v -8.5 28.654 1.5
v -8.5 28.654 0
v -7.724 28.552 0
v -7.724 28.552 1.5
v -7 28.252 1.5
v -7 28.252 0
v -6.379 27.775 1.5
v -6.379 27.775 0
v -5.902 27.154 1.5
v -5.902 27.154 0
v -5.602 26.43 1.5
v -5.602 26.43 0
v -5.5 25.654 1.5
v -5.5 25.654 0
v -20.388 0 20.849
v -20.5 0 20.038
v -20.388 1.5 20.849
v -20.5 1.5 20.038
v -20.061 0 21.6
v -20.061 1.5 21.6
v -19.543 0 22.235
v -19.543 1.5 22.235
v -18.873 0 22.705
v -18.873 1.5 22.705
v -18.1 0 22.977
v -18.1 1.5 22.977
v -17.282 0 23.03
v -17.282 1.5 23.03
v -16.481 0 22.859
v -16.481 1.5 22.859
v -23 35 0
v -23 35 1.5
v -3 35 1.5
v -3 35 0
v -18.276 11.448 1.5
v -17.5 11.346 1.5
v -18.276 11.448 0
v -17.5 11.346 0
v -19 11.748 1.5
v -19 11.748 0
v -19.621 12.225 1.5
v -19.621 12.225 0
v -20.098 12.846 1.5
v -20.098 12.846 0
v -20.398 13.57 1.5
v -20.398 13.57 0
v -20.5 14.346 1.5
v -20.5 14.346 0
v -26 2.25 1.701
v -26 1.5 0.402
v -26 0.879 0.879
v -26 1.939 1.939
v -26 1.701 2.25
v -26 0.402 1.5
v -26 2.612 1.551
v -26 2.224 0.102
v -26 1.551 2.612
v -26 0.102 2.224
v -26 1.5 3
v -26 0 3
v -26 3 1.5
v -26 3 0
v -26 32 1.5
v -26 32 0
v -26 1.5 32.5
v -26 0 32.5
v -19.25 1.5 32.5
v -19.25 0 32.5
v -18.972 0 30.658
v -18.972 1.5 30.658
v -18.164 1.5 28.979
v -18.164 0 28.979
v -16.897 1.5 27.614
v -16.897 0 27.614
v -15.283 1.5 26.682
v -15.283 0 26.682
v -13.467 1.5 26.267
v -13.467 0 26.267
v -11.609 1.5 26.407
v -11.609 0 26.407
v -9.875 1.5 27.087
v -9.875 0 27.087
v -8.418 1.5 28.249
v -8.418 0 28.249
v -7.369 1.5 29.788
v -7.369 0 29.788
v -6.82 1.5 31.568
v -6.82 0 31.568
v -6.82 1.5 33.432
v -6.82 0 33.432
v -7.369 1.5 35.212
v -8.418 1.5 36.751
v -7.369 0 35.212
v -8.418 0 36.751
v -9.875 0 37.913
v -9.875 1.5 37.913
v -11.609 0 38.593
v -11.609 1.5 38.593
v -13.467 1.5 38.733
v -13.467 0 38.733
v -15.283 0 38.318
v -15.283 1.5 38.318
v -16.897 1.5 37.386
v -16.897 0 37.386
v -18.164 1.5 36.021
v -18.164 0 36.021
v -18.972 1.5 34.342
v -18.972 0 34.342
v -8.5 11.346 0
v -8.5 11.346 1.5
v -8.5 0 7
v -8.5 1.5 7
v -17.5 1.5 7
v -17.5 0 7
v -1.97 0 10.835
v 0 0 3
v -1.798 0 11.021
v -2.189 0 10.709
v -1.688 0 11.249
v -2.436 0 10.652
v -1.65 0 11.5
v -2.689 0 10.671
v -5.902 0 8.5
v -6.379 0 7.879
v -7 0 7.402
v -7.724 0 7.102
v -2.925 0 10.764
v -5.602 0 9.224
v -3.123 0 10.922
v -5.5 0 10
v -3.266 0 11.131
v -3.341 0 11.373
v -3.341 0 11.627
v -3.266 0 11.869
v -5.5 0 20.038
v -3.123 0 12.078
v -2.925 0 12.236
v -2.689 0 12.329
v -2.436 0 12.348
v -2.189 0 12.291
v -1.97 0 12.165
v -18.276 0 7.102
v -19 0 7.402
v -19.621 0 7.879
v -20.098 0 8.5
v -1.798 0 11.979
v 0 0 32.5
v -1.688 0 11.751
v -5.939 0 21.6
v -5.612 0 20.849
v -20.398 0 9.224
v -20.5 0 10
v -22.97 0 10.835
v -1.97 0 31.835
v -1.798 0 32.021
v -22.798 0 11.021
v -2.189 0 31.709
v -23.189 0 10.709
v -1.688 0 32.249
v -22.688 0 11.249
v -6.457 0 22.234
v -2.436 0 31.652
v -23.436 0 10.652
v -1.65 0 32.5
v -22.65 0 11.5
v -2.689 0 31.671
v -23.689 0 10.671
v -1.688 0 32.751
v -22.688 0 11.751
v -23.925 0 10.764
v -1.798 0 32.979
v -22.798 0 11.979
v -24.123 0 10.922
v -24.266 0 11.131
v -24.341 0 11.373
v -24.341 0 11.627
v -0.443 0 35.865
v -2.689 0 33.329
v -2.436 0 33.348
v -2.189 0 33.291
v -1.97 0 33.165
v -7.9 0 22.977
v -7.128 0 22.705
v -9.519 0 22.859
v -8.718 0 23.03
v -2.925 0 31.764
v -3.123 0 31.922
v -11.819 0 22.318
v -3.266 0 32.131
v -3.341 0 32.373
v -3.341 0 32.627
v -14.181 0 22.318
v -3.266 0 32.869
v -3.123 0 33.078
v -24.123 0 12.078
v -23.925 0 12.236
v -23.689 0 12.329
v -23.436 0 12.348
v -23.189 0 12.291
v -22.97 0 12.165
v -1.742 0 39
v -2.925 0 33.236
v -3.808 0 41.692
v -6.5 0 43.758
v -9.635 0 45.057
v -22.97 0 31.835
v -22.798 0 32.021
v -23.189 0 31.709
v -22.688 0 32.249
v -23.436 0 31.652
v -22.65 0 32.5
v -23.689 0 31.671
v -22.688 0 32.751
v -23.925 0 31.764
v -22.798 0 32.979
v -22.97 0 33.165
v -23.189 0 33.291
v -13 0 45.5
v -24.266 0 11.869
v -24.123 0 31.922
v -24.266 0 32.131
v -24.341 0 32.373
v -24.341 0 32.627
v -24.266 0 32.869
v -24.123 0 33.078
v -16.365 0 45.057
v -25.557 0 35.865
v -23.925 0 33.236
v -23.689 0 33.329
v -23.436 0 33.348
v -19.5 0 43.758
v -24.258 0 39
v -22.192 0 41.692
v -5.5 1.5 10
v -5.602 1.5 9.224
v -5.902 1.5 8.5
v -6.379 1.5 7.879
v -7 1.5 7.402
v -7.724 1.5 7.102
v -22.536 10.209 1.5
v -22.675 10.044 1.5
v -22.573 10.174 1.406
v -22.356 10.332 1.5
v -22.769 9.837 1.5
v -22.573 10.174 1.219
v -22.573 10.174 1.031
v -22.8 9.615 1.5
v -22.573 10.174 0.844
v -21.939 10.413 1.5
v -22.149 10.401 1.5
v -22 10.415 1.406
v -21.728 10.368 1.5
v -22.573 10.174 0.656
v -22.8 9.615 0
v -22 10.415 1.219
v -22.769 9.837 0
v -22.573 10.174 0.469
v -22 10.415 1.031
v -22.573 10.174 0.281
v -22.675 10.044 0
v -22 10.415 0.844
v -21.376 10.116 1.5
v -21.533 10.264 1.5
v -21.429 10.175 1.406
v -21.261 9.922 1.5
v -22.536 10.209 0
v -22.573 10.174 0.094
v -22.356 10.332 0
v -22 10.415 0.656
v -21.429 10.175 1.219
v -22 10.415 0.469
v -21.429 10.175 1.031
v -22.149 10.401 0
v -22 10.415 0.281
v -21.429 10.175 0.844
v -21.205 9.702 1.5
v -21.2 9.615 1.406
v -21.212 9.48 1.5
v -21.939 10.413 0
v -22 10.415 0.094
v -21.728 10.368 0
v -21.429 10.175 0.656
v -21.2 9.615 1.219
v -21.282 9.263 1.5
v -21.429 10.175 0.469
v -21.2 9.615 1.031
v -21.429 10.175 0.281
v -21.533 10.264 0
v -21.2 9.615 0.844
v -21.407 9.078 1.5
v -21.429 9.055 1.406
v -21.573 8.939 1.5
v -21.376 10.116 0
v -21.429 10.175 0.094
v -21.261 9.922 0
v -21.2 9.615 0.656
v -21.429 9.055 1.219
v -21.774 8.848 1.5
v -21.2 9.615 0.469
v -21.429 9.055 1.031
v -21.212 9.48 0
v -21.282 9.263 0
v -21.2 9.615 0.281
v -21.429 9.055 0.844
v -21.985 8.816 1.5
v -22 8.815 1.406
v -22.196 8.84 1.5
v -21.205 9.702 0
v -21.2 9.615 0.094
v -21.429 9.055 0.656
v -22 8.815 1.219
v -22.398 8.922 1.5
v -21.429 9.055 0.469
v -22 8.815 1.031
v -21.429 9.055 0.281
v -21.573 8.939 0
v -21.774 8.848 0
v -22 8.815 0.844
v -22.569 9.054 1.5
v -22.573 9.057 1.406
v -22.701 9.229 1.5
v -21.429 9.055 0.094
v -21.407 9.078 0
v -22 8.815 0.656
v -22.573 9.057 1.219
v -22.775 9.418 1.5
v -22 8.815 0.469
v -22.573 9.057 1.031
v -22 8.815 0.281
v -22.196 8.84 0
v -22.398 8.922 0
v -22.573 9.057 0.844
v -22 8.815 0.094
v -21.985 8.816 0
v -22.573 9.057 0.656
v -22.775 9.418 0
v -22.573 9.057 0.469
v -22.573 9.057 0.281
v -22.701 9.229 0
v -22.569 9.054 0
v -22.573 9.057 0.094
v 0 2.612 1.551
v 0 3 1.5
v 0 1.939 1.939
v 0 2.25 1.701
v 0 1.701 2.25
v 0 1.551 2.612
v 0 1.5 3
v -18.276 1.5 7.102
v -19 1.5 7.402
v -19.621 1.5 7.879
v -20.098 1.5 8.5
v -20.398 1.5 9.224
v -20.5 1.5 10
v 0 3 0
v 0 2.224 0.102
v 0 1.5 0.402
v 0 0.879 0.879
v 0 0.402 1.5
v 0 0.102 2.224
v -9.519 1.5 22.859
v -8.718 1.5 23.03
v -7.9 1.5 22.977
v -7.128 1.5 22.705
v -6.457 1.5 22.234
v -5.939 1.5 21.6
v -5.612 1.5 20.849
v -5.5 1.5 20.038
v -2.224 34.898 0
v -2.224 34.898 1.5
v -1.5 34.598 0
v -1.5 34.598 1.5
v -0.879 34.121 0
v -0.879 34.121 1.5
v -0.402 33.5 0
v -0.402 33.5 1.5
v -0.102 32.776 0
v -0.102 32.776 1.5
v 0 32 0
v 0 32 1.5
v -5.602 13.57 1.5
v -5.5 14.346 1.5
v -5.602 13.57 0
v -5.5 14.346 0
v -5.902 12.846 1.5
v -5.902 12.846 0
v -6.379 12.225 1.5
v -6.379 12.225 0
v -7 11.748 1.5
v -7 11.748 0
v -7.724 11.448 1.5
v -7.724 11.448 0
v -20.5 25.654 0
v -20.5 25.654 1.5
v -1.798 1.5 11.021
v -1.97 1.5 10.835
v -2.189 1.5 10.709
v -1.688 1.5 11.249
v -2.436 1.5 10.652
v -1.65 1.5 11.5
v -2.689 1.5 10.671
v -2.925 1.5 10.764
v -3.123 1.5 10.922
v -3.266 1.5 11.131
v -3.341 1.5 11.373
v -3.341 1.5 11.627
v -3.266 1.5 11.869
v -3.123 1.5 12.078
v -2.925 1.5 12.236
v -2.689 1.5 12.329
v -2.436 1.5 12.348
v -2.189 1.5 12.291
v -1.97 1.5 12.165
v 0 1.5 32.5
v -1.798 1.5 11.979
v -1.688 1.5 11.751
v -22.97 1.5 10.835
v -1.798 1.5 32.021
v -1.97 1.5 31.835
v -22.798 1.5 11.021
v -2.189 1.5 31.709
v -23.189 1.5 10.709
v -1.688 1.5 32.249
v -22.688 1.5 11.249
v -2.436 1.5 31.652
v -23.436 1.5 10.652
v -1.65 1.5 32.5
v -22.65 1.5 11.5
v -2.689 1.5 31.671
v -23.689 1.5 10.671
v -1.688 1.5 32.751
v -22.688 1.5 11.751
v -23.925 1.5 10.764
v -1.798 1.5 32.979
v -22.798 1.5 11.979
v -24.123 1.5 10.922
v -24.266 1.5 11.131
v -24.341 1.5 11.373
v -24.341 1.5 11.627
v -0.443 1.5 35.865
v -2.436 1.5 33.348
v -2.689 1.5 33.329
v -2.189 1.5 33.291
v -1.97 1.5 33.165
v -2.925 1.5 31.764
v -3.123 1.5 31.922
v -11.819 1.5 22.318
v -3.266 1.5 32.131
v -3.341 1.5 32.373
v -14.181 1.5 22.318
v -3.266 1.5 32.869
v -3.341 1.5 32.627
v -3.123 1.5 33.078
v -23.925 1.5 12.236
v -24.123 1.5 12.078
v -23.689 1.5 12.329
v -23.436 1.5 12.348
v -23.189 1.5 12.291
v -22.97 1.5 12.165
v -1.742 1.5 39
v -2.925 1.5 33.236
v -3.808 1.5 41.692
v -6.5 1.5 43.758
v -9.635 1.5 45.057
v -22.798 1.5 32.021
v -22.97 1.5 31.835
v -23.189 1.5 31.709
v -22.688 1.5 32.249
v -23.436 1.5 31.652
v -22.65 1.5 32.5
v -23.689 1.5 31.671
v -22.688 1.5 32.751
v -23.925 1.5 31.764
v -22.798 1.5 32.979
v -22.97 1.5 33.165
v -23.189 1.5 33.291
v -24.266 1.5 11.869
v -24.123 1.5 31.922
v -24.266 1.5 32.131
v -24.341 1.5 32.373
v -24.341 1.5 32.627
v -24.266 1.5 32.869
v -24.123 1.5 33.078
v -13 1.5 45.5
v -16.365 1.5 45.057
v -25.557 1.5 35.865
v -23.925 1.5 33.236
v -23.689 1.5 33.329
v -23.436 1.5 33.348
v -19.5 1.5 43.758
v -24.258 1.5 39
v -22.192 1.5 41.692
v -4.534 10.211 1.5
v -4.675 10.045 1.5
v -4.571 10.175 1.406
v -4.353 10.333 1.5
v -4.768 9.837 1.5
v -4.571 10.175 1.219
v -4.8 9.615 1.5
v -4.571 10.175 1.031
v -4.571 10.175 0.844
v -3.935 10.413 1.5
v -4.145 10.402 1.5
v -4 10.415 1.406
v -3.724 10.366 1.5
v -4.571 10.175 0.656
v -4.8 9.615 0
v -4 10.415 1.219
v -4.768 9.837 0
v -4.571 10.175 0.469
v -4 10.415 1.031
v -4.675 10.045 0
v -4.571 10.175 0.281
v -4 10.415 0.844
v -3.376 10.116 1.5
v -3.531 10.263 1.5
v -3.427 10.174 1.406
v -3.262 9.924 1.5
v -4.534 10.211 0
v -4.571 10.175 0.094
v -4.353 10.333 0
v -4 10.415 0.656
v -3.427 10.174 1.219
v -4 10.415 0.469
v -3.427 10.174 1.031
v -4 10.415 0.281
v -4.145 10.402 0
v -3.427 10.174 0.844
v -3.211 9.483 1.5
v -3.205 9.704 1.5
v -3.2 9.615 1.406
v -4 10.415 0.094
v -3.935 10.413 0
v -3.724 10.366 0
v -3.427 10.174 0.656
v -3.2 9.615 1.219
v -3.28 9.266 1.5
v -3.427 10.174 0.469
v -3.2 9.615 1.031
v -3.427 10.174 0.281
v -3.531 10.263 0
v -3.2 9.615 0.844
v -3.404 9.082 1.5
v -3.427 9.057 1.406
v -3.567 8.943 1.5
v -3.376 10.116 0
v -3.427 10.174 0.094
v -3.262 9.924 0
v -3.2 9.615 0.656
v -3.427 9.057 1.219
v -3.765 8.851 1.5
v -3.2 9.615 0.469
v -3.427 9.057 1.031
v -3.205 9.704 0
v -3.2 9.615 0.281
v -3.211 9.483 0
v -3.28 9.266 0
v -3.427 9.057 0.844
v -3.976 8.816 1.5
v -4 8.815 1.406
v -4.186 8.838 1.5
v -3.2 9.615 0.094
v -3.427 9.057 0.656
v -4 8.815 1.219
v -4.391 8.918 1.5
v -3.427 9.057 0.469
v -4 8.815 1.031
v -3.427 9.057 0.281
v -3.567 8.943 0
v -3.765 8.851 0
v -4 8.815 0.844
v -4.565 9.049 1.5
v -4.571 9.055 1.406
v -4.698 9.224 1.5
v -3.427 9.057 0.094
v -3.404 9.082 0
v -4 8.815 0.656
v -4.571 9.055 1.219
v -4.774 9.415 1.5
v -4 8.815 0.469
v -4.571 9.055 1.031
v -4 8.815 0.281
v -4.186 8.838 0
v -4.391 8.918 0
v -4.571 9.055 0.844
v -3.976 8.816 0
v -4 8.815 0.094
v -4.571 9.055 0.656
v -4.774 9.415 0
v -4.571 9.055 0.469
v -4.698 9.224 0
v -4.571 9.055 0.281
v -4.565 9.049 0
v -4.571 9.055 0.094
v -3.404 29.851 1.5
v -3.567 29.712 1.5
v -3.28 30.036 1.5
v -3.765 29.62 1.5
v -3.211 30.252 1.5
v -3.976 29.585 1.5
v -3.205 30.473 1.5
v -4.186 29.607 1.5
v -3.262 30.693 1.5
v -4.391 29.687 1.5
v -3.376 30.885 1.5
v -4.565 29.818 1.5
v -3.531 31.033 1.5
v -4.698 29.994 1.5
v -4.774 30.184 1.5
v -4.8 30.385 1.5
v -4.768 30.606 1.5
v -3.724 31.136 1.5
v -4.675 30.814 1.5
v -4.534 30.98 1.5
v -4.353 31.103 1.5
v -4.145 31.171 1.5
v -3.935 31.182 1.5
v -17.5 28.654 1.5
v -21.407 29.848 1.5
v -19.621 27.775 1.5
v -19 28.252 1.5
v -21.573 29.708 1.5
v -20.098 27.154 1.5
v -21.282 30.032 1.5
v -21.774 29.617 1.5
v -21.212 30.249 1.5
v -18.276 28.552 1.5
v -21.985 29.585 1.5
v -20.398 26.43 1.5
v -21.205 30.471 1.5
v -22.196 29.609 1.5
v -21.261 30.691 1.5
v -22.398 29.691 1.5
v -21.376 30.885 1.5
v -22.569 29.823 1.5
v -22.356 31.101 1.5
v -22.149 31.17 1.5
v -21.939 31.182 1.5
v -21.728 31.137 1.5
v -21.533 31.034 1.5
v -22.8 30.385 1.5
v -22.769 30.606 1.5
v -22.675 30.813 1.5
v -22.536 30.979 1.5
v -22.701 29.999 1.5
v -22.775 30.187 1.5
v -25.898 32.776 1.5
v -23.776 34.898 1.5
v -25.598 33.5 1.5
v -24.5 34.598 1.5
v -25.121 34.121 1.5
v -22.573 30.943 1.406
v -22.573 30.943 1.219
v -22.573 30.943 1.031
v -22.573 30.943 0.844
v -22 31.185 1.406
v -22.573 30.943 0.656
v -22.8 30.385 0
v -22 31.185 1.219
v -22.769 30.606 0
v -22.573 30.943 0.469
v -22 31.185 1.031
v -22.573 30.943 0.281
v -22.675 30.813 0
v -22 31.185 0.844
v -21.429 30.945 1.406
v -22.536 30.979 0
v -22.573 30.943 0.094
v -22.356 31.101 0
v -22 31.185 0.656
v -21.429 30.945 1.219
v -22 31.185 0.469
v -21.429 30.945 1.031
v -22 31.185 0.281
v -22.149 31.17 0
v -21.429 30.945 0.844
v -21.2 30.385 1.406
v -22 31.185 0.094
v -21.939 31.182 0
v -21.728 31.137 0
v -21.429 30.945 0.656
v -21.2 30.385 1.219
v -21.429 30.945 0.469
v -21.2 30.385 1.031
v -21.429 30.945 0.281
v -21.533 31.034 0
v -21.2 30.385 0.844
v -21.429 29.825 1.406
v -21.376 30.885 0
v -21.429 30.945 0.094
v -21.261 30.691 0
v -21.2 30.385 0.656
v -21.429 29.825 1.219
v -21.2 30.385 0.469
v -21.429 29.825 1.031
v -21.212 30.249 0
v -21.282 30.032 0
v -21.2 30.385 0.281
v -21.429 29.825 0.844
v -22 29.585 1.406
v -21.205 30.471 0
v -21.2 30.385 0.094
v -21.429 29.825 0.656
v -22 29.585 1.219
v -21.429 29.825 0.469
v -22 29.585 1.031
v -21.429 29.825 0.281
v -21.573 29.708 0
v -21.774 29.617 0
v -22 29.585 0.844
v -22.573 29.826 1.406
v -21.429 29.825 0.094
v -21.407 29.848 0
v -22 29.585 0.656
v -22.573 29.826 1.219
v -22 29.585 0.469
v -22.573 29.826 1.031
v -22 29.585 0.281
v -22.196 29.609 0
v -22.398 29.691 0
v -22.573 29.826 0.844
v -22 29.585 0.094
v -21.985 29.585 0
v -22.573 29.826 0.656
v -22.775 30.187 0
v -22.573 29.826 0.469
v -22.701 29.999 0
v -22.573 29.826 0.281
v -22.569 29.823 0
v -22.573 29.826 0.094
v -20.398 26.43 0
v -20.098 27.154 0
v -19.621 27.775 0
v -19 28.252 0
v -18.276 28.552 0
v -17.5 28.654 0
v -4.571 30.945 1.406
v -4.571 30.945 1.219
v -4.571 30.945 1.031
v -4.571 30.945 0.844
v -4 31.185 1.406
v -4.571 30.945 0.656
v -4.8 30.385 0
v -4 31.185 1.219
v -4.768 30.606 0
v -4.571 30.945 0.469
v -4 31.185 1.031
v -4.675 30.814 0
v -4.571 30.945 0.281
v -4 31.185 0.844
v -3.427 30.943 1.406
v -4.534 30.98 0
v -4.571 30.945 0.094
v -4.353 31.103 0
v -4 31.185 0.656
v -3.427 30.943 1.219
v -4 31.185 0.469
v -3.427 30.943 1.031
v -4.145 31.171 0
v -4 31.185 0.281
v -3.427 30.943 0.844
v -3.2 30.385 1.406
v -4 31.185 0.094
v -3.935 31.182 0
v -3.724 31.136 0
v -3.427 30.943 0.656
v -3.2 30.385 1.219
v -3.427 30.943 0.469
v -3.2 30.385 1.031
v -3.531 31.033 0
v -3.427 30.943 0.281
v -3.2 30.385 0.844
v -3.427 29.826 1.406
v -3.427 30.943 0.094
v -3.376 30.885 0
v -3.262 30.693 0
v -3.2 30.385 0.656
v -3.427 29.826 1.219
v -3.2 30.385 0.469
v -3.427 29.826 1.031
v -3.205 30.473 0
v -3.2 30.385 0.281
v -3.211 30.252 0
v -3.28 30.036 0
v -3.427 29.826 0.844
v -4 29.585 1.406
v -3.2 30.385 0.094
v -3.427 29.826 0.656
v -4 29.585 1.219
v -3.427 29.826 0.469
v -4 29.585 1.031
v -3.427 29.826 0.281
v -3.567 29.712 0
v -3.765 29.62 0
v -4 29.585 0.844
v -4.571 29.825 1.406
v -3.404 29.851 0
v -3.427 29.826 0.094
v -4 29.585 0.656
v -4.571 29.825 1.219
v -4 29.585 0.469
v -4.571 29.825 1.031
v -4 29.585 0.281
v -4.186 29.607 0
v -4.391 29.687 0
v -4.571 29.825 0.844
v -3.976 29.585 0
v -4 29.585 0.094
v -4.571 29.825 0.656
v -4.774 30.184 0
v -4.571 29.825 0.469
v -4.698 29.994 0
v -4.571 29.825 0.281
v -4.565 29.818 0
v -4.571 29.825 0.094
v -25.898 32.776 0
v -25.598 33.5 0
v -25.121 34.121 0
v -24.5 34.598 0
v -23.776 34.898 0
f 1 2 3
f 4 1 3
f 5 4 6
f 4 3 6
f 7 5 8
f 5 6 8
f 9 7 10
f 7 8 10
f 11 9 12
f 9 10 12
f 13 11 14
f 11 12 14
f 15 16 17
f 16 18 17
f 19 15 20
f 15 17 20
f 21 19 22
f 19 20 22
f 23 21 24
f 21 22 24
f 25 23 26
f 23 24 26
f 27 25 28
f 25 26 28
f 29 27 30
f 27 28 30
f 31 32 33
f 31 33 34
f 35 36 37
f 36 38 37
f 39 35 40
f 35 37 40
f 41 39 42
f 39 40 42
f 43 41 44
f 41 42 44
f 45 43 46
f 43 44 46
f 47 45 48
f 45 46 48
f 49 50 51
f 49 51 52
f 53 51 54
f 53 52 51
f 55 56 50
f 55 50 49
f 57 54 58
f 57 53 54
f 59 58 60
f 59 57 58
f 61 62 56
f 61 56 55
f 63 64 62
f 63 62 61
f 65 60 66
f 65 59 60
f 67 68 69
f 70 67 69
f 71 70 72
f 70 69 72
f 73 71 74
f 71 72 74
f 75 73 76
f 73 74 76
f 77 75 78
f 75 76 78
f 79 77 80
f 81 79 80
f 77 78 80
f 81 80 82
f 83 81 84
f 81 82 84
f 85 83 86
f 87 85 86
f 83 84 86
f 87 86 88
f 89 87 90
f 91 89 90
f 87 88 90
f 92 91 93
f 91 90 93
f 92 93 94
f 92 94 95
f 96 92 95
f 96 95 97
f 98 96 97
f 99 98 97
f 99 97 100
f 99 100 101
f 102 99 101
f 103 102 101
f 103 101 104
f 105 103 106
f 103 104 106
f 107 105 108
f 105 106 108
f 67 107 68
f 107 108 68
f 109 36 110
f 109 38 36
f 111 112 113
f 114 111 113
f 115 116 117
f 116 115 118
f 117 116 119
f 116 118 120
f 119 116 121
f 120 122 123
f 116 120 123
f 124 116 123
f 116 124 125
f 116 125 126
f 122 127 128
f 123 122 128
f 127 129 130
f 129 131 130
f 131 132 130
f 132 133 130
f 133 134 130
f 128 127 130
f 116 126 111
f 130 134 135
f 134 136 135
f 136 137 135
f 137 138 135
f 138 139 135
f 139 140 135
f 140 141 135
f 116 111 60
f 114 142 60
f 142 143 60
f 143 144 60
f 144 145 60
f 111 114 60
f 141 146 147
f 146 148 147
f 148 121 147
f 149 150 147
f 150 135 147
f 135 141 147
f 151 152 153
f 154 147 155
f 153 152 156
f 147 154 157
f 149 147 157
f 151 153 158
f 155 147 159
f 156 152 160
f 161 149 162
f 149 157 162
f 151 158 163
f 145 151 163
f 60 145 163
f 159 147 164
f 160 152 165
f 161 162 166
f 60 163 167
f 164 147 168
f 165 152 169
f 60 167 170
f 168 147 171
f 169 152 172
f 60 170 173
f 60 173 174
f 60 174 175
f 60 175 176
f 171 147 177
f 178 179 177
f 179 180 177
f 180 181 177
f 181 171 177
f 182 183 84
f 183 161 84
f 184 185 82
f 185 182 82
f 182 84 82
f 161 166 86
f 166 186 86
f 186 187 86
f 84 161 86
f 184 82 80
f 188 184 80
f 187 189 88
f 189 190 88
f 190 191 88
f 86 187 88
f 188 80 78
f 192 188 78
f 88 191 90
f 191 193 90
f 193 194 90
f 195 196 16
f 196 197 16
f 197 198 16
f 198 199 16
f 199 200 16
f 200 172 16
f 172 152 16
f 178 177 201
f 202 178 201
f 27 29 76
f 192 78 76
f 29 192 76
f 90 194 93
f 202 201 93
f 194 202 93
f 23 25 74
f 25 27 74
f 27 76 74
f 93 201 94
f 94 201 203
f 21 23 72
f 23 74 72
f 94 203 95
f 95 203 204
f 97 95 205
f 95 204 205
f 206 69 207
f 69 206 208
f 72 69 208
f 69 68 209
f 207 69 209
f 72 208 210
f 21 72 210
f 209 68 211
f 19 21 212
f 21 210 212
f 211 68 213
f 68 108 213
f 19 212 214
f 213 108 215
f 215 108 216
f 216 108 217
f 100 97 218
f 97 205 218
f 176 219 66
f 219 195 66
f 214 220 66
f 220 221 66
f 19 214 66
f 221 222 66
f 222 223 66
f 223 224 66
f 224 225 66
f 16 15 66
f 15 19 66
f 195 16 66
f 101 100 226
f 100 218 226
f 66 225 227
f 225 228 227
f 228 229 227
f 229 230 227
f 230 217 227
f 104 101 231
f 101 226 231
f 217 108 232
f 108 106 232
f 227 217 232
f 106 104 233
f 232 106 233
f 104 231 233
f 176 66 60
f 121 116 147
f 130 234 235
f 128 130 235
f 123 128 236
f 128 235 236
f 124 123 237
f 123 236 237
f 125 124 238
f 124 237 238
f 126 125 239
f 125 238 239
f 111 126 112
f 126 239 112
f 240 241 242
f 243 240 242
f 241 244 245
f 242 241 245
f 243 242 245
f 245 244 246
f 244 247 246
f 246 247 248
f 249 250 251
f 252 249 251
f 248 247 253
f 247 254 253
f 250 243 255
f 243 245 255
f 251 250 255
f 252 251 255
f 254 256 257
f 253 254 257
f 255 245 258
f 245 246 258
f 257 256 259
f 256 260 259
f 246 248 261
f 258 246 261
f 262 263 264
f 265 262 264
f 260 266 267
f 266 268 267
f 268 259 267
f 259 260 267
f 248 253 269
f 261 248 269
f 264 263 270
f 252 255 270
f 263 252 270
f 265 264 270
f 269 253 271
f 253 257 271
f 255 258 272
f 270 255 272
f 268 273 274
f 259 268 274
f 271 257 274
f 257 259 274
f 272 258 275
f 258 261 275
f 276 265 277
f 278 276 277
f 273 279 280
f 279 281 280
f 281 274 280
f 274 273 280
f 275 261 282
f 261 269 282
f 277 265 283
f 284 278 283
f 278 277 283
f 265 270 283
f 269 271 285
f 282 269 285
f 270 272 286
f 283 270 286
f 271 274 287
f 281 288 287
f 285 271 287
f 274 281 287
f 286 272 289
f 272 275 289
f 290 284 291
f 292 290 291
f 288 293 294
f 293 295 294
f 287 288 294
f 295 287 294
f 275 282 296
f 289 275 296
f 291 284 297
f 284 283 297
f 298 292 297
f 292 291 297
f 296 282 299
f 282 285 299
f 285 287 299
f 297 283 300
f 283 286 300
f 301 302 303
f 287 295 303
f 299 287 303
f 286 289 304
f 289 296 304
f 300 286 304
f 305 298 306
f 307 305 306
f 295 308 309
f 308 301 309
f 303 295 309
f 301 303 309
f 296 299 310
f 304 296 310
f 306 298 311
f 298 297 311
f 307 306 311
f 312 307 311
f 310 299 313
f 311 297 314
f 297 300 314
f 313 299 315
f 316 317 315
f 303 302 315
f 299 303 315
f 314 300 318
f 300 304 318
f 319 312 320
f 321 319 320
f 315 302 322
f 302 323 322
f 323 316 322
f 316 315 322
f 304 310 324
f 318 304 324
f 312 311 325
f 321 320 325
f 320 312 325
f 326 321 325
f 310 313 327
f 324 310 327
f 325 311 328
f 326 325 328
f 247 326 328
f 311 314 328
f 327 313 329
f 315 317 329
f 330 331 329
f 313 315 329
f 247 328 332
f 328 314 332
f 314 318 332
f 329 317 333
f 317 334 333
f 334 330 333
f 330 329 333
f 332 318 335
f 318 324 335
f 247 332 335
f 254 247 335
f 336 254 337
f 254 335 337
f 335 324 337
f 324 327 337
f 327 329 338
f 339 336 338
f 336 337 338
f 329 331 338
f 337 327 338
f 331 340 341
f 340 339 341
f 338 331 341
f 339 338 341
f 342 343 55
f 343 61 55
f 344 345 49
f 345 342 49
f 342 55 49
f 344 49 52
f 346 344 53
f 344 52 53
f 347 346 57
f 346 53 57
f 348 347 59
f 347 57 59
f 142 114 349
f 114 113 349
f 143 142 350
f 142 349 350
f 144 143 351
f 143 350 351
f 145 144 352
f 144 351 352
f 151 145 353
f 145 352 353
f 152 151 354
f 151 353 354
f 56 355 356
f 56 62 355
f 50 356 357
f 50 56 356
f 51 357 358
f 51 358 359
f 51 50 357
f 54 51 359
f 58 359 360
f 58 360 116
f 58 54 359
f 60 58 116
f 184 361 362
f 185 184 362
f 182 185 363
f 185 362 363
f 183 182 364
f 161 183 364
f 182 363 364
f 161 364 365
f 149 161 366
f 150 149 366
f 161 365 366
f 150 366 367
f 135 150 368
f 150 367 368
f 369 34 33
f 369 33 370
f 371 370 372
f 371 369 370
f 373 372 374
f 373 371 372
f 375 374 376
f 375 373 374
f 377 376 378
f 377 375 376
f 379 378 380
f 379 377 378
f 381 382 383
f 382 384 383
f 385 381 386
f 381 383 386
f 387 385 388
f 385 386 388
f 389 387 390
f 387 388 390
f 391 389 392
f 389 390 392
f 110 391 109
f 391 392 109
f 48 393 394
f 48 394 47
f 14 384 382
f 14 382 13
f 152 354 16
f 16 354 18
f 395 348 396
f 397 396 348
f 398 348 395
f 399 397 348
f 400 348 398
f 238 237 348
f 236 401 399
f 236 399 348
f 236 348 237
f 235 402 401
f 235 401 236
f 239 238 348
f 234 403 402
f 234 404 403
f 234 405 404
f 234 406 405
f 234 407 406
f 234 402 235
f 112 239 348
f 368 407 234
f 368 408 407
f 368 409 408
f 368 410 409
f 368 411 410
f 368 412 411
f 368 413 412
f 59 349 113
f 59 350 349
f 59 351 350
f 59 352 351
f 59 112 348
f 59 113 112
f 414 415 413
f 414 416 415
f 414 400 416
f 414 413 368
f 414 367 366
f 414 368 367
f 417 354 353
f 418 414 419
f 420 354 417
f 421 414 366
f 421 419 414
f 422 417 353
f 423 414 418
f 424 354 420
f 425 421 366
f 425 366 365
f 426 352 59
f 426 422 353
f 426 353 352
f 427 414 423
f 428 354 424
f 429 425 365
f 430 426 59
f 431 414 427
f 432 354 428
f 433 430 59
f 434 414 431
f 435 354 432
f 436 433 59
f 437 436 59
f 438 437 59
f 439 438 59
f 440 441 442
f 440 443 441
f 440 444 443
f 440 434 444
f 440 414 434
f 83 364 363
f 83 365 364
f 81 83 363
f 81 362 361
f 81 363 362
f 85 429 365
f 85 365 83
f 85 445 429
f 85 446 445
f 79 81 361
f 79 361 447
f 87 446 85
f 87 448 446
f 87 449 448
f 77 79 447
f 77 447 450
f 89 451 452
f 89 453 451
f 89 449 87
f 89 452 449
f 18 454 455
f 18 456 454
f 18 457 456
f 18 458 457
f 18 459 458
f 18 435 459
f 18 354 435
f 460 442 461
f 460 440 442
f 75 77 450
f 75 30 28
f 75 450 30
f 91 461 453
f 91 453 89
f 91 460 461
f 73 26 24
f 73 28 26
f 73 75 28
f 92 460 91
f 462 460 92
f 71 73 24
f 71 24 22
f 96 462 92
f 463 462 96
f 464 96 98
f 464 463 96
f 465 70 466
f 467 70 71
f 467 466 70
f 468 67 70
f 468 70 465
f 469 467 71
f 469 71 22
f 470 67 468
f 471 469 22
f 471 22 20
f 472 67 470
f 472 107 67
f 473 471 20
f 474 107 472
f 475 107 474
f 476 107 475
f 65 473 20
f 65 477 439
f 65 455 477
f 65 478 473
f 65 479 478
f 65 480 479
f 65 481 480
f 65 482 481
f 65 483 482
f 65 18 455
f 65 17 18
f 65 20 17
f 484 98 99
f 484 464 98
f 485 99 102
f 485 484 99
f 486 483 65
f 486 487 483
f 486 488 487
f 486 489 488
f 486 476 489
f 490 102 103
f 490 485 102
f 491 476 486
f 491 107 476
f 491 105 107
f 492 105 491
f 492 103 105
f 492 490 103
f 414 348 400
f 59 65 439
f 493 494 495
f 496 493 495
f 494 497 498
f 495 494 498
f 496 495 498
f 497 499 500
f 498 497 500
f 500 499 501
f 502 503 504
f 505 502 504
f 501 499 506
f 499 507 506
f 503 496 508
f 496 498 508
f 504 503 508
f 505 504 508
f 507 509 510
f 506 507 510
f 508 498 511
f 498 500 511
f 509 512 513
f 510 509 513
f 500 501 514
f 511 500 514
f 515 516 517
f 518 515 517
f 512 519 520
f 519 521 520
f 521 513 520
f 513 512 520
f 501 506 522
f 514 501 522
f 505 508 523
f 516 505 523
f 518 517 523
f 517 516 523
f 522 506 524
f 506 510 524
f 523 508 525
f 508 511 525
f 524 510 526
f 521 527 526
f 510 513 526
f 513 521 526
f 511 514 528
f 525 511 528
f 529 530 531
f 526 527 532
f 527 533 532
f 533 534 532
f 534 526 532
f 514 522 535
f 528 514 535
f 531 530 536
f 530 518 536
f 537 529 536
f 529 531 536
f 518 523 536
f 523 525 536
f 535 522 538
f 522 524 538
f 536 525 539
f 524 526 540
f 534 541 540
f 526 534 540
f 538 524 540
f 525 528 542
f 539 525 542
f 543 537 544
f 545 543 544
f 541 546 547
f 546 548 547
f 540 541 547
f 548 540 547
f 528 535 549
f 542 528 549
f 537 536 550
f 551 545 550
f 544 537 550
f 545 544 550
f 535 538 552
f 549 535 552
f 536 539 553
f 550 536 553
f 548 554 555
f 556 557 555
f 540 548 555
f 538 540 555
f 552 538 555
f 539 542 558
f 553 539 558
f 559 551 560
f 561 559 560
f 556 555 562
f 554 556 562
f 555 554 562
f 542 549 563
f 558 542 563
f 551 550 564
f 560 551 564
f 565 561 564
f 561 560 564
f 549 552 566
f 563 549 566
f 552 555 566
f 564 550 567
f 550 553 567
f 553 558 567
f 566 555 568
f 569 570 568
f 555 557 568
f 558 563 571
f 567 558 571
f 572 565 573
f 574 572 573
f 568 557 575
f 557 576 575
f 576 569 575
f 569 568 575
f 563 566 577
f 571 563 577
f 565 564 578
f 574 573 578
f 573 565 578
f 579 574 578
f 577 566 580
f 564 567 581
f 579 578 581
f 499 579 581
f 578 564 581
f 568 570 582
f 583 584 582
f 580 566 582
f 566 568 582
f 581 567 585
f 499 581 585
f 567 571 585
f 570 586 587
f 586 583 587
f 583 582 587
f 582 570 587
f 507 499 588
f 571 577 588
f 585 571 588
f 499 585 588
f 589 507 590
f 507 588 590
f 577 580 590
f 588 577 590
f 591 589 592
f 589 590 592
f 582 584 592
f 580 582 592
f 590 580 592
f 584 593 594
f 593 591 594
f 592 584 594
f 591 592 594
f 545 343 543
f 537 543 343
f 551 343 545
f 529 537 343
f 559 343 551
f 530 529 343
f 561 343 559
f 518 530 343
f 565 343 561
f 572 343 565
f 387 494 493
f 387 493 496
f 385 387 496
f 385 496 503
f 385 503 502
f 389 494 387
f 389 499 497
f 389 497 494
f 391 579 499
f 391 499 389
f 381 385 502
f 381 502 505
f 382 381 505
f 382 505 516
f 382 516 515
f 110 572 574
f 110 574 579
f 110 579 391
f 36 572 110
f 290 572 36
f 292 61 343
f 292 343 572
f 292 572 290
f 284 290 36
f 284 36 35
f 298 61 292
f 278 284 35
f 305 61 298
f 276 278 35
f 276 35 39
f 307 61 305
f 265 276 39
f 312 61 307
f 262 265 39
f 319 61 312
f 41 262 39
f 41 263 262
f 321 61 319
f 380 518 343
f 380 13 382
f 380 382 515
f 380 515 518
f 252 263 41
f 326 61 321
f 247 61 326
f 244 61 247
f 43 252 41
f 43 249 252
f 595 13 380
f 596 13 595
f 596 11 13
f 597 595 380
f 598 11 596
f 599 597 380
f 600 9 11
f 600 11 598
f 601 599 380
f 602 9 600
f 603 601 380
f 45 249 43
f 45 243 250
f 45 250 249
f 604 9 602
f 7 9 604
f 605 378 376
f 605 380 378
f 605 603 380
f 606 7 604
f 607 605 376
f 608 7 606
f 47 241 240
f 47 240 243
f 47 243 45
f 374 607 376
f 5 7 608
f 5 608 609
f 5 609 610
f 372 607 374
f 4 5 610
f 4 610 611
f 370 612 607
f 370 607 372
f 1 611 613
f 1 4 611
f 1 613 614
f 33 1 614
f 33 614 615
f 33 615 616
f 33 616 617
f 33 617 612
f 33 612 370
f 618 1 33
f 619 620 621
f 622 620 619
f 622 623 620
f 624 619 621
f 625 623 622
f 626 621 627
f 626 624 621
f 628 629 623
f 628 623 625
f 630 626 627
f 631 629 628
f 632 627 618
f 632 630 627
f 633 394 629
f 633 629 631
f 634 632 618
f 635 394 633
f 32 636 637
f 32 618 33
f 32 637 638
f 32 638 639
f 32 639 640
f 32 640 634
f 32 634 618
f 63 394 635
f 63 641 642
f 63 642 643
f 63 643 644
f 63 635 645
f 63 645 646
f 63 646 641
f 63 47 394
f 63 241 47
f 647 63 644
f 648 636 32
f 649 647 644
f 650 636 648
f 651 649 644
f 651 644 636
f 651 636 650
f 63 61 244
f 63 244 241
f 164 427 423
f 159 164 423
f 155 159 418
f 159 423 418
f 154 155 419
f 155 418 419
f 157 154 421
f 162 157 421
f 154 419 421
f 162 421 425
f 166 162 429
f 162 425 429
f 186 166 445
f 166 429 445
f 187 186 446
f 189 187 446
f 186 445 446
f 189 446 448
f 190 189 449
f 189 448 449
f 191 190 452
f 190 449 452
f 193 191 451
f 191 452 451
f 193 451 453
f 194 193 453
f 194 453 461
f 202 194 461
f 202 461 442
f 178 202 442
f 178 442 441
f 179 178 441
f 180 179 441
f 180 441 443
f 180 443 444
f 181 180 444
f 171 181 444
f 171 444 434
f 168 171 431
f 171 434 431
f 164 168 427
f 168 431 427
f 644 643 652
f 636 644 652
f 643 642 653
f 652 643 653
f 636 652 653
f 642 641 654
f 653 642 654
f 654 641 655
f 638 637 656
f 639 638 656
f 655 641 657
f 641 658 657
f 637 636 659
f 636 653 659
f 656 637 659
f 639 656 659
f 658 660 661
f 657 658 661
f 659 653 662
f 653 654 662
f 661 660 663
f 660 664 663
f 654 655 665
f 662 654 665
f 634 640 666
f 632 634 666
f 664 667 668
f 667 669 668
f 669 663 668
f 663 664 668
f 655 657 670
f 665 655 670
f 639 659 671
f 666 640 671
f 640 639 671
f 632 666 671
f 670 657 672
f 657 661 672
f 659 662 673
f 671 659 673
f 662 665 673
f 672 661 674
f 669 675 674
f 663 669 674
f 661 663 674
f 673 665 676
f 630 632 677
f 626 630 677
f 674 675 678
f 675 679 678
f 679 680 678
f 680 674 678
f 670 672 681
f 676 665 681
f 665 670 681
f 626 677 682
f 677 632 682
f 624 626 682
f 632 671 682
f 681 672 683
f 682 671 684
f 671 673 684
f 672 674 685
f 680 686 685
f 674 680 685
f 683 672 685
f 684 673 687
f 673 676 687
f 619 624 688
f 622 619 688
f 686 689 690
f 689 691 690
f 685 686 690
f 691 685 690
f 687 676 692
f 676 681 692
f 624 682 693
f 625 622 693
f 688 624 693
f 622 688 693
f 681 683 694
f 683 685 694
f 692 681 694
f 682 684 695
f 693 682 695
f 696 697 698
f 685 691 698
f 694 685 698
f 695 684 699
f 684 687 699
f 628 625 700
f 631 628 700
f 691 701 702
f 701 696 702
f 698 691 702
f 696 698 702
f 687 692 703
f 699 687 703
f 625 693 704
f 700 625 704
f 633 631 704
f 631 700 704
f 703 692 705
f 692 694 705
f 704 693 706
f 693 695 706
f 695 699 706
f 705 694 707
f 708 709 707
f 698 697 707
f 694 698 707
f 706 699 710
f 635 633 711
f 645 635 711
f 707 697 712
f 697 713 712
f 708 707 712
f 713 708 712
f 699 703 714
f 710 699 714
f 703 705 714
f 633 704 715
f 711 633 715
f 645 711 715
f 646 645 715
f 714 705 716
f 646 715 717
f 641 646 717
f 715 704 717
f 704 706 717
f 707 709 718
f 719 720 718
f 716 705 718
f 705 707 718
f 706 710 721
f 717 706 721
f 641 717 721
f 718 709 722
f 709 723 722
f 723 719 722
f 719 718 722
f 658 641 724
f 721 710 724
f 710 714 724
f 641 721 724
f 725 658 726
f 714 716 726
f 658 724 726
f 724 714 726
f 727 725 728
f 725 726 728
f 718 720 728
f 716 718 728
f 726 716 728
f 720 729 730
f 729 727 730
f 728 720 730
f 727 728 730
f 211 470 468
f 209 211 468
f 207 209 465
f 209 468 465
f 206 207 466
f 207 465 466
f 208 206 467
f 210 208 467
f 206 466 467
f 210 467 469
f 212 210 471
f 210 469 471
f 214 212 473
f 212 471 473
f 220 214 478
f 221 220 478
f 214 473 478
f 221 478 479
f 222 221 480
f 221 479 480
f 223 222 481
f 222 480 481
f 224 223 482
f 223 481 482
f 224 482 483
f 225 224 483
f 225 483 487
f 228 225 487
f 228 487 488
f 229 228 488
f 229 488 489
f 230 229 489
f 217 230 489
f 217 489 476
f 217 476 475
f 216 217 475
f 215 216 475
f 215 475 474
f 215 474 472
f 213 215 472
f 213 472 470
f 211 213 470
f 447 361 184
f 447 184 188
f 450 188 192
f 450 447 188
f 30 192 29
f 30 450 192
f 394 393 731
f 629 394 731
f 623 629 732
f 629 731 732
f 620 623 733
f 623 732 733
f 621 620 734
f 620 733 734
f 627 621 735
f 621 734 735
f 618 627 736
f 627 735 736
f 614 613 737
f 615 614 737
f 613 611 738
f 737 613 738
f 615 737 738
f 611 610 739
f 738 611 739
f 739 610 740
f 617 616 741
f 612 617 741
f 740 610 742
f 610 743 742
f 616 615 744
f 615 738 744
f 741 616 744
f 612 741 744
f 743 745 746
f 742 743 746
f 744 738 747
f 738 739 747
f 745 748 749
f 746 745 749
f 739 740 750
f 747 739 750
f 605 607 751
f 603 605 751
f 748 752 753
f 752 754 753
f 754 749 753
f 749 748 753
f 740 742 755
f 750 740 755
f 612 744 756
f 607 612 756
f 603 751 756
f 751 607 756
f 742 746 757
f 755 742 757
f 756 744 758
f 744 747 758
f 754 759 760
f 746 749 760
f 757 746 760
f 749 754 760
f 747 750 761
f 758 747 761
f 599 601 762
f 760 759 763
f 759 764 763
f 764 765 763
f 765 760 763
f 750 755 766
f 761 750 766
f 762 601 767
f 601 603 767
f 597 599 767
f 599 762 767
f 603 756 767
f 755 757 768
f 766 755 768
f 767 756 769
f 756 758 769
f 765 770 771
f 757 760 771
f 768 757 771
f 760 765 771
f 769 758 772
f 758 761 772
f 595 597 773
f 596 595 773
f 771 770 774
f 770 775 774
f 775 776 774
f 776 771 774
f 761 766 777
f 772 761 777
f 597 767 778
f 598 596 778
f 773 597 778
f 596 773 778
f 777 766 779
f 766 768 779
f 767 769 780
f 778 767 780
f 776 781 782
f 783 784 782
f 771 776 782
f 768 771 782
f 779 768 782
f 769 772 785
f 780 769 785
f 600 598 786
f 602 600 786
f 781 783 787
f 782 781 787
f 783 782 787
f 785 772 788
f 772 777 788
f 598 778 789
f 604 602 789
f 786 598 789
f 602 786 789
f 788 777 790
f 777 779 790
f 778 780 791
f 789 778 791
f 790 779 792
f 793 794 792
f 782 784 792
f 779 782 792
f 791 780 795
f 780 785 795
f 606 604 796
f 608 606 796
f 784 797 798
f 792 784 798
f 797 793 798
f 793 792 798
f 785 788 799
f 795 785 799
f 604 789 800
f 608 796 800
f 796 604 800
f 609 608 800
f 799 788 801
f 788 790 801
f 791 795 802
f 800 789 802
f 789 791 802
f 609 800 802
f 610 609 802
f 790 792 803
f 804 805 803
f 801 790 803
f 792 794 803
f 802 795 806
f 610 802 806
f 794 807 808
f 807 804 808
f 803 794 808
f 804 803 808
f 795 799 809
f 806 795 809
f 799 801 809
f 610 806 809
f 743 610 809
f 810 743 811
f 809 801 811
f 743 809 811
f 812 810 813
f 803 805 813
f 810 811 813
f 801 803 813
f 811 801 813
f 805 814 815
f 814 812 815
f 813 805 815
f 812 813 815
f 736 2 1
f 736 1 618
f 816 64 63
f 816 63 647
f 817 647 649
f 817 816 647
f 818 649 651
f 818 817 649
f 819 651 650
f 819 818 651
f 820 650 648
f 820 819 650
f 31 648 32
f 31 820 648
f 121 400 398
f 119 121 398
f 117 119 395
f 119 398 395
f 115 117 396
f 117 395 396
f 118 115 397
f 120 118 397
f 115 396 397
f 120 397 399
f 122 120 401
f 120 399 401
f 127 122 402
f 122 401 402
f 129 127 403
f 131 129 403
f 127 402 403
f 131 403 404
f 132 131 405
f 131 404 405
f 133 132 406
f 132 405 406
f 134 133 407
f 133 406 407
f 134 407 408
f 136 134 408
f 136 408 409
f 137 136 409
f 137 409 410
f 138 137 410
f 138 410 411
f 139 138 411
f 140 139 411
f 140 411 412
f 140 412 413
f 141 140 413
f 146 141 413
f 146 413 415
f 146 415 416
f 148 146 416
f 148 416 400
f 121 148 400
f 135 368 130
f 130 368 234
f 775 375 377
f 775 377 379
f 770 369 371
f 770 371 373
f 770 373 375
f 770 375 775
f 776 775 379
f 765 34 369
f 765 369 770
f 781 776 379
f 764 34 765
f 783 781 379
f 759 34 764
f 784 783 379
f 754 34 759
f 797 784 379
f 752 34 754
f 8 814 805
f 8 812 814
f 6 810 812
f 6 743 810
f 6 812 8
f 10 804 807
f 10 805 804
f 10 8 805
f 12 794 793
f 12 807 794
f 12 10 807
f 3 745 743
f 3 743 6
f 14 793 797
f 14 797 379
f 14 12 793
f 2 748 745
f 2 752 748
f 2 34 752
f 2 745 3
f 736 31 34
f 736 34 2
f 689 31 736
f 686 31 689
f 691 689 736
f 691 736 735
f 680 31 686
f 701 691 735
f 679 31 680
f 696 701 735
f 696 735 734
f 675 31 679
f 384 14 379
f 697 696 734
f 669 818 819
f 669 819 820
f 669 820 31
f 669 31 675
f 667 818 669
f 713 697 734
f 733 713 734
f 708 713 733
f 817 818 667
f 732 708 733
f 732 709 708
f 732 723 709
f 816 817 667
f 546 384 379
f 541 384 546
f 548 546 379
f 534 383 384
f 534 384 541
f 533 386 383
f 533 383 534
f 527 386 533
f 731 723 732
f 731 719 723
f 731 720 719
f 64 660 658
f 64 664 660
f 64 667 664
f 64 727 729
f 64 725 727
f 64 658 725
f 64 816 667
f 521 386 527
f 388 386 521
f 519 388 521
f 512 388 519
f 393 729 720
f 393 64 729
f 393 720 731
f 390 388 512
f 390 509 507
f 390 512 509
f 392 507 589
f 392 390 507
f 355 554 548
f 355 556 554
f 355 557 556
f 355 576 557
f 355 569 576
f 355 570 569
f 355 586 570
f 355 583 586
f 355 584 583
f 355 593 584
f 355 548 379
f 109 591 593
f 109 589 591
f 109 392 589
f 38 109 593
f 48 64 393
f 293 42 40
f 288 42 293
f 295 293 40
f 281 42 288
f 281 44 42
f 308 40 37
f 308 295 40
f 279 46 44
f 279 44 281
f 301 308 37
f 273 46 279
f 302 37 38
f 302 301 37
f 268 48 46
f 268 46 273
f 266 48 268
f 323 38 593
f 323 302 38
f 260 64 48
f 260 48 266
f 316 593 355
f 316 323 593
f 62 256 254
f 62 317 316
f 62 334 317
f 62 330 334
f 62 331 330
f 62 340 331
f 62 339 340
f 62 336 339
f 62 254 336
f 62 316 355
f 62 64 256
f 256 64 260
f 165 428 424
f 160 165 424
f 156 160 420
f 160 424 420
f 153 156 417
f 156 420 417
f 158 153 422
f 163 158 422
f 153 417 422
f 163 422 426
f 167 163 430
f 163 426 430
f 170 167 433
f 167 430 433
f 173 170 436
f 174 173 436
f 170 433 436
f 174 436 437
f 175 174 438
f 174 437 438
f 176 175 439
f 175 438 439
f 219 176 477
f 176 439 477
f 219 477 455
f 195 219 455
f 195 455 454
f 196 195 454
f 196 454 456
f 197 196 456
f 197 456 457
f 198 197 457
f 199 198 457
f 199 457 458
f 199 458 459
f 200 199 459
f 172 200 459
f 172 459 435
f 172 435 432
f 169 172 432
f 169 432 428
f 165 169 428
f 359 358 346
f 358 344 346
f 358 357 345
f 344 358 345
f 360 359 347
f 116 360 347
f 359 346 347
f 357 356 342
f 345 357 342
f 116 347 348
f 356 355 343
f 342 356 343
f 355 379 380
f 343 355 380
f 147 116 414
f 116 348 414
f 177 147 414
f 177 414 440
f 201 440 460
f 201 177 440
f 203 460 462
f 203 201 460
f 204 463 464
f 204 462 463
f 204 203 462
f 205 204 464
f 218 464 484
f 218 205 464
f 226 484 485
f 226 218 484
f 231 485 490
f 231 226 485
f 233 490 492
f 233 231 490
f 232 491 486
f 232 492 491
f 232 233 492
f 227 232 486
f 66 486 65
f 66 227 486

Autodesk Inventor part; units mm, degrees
ref_plane "YZ Plane" through (0, 0, 0) normal (1, 0, 0) x (0, 1, 0)
ref_plane "XZ Plane" through (0, 0, 0) normal (0, 1, 0) x (-1, 0, 0)
ref_plane "XY Plane" through (0, 0, 0) normal (0, 0, 1) x (1, 0, 0)
sketch "スケッチ1" plane through (0, 0, 0) normal (0, 1, 0) x (-1, 0, 0)
  line L0 (26, 0) -> (0, 0)
  line L1 (0, 0) -> (0, -89.5474)
  line L2 (0, -89.5474) -> (26, -89.5474)
  line L3 (26, -89.5474) -> (26, 0)
  line L4 (26, 0) -> (0, 0)
  line L5 (0, 0) -> (0, 70)
  line L6 (0, 70) -> (26, 70)
  line L7 (26, 70) -> (26, 0)
  line L8 (26, 32.5) -> (0, 32.5)
  circle A0 centre (13, 32.5) radius 6.25
  circle A1 centre (13, 32.5) radius 13
  point P0 (26, 32.5)
  point P1 (0, 32.5)
  dimension "d2" = 70
  dimension "d3" = 26
  dimension "d4" = 32.5
  dimension "d5" = 12.5
extrude "プレート1" add sketch "スケッチ1" along normal blind 1.5 contours L0 L5 A1 L7 | A1 L8 A0 | L8 A0 A1
sketch "スケッチ2" plane through (-26, 0, 1.5) normal (0, 0, -1) x (-1, 0, 0)
  line L0 (-26, 0) -> (0, 0)
  line L1 (0, 0) -> (0, 35)
  line L2 (0, 35) -> (-26, 35)
  line L3 (-26, 35) -> (-26, 0)
edge flange "フランジ1" height 35 angle 90 thickness 1.5 bend radius 1.5 thickness toward (0, 0, -1) relief tear relief width 1.5 relief depth 0.75 edges at (-13, 1.5, 0) wall of the first edge with corners at (0, 0, 1.5) (-26, 0, 1.5) (-26, 35, 1.5) (0, 35, 1.5)
bend "曲げ1"
corner "コーナー1"
sketch "スケッチ3" plane through (0, 1.5, 0) normal (0, 1, 0) x (1, 0, 0)
  circle A0 centre (-23.5, -32.5) radius 0.85 projected
  circle A1 centre (-23.5, -11.5) radius 0.85 projected
  circle A2 centre (-2.5, -11.5) radius 0.85 projected
  circle A3 centre (-2.5, -32.5) radius 0.85 projected
  point P0 (0, 0)
extrude "切り取り1" cut sketch "スケッチ3" against normal blind 1.5
sketch "スケッチ4" plane through (0, 35, 0) normal (0, 0, -1) x (-1, 0, 0)
  spline S0 degree 3 poles (4.8, -25.3846) (4.8, -25.2845) (4.78, -25.178) (4.6999, -24.983) (4.6397, -24.8944) (4.4988, -24.7507) (4.4073, -24.6876) (4.208, -24.6046) (4.1004, -24.5846) (3.8988, -24.5846) (3.7907, -24.6049) (3.5913, -24.6885) (3.4999, -24.7517) (3.3597, -24.8953) (3.2999, -24.9835) (3.22, -25.178) (3.2, -25.2844) (3.2, -25.4848) (3.22, -25.5912) (3.2999, -25.7858) (3.3597, -25.8739) (3.4999, -26.0176) (3.5913, -26.0808) (3.7907, -26.1643) (3.8988, -26.1846) (4.1004, -26.1846) (4.208, -26.1646) (4.4073, -26.0816) (4.4988, -26.0186) (4.6397, -25.8748) (4.6999, -25.7862) (4.78, -25.5912) (4.8, -25.4847) (4.8, -25.3846) knots 0 0 0 0 0.060514 0.060514 0.121029 0.121029 0.185215 0.185215 0.249402 0.249402 0.314126 0.314126 0.37885 0.37885 0.439425 0.439425 0.5 0.5 0.560575 0.560575 0.62115 0.62115 0.685874 0.685874 0.750598 0.750598 0.814785 0.814785 0.878971 0.878971 0.939486 0.939486 1 1 1 1
  spline S1 degree 3 poles (4.8, -4.6154) (4.8, -4.5153) (4.78, -4.4088) (4.6999, -4.2138) (4.6397, -4.1252) (4.4988, -3.9814) (4.4073, -3.9184) (4.208, -3.8354) (4.1004, -3.8154) (3.8988, -3.8154) (3.7907, -3.8357) (3.5913, -3.9192) (3.4999, -3.9824) (3.3597, -4.1261) (3.2999, -4.2142) (3.22, -4.4088) (3.2, -4.5152) (3.2, -4.7156) (3.22, -4.822) (3.2999, -5.0165) (3.3597, -5.1047) (3.4999, -5.2483) (3.5913, -5.3115) (3.7907, -5.3951) (3.8988, -5.4154) (4.1004, -5.4154) (4.208, -5.3954) (4.4073, -5.3124) (4.4988, -5.2493) (4.6397, -5.1056) (4.6999, -5.017) (4.78, -4.822) (4.8, -4.7155) (4.8, -4.6154) knots 0 0 0 0 0.060514 0.060514 0.121029 0.121029 0.185215 0.185215 0.249402 0.249402 0.314126 0.314126 0.37885 0.37885 0.439425 0.439425 0.5 0.5 0.560575 0.560575 0.62115 0.62115 0.685874 0.685874 0.750598 0.750598 0.814785 0.814785 0.878971 0.878971 0.939486 0.939486 1 1 1 1
  spline S2 degree 3 poles (22.8, -4.6154) (22.8, -4.5152) (22.78, -4.4088) (22.7001, -4.2142) (22.6403, -4.1261) (22.5001, -3.9824) (22.4087, -3.9192) (22.2093, -3.8357) (22.1012, -3.8154) (21.8996, -3.8154) (21.792, -3.8354) (21.5927, -3.9184) (21.5012, -3.9814) (21.3603, -4.1252) (21.3001, -4.2138) (21.22, -4.4088) (21.2, -4.5153) (21.2, -4.7155) (21.22, -4.822) (21.3001, -5.017) (21.3603, -5.1056) (21.5012, -5.2493) (21.5927, -5.3124) (21.792, -5.3954) (21.8996, -5.4154) (22.1012, -5.4154) (22.2093, -5.3951) (22.4087, -5.3115) (22.5001, -5.2483) (22.6403, -5.1047) (22.7001, -5.0165) (22.78, -4.822) (22.8, -4.7156) (22.8, -4.6154) knots 0 0 0 0 0.060575 0.060575 0.12115 0.12115 0.185874 0.185874 0.250598 0.250598 0.314785 0.314785 0.378971 0.378971 0.439486 0.439486 0.5 0.5 0.560514 0.560514 0.621029 0.621029 0.685215 0.685215 0.749402 0.749402 0.814126 0.814126 0.87885 0.87885 0.939425 0.939425 1 1 1 1
  spline S3 degree 3 poles (22.8, -25.3846) (22.8, -25.2844) (22.78, -25.178) (22.7001, -24.9835) (22.6403, -24.8953) (22.5001, -24.7517) (22.4087, -24.6885) (22.2093, -24.6049) (22.1012, -24.5846) (21.8996, -24.5846) (21.792, -24.6046) (21.5927, -24.6876) (21.5012, -24.7507) (21.3603, -24.8944) (21.3001, -24.983) (21.22, -25.178) (21.2, -25.2845) (21.2, -25.4847) (21.22, -25.5912) (21.3001, -25.7862) (21.3603, -25.8748) (21.5012, -26.0186) (21.5927, -26.0816) (21.792, -26.1646) (21.8996, -26.1846) (22.1012, -26.1846) (22.2093, -26.1643) (22.4087, -26.0808) (22.5001, -26.0176) (22.6403, -25.8739) (22.7001, -25.7858) (22.78, -25.5912) (22.8, -25.4848) (22.8, -25.3846) knots 0 0 0 0 0.060575 0.060575 0.12115 0.12115 0.185874 0.185874 0.250598 0.250598 0.314785 0.314785 0.378971 0.378971 0.439486 0.439486 0.5 0.5 0.560514 0.560514 0.621029 0.621029 0.685215 0.685215 0.749402 0.749402 0.814126 0.814126 0.87885 0.87885 0.939425 0.939425 1 1 1 1
  point P0 (0, -35)
  point P1 (4.8, -25.3846)
  point P2 (4.8, -4.6154)
  point P3 (22.8, -4.6154)
  point P4 (22.8, -25.3846)
extrude "切り取り2" cut sketch "スケッチ4" against normal blind 1.5
sketch "スケッチ5" plane through (0, 1.5, 0) normal (0, 1, 0) x (1, 0, 0)
  line L0 (-20.5, -10) -> (-20.5, -20.0376) projected
  arc A0 (-20.5, -20.0376) -> (-16.4811, -22.8592) centre (-17.5, -20.0376) ccw projected
  arc A1 (-9.5189, -22.8592) -> (-16.4811, -22.8592) centre (-13, -32.5) ccw projected
  arc A2 (-9.5189, -22.8592) -> (-5.5, -20.0376) centre (-8.5, -20.0376) ccw projected
  line L1 (-5.5, -20.0376) -> (-5.5, -10) projected
  arc A3 (-5.5, -10) -> (-8.5, -7) centre (-8.5, -10) ccw projected
  line L2 (-8.5, -7) -> (-17.5, -7) projected
  arc A4 (-17.5, -7) -> (-20.5, -10) centre (-17.5, -10) ccw projected
  line L3 (-26, -3) -> (0, -3) projected
  line L4 (0, -32.5) -> (0, -3) projected
  arc A5 (-26, -32.5) -> (0, -32.5) centre (-13, -32.5) ccw projected
  line L5 (-26, -3) -> (-26, -32.5) projected
  circle A6 centre (-13, -32.5) radius 6.25 projected
  circle A7 centre (-23.5, -32.5) radius 0.85 projected
  circle A8 centre (-2.5, -11.5) radius 0.85 projected
  circle A9 centre (-2.5, -32.5) radius 0.85 projected
  circle A10 centre (-23.5, -11.5) radius 0.85 projected
  point P0 (0, 0)
extrude "切り取り3" cut sketch "スケッチ5" against normal blind 1.5 contours A4 L2 A3 L1 A2 A1 A0 L0
sketch "スケッチ6" plane through (0, 35, 0) normal (0, 0, -1) x (-1, 0, 0)
  line L0 (26, 0) -> (26, -32) projected
  line L1 (0, 0) -> (26, 0) projected
  line L2 (0, -32) -> (0, 0) projected
  circle A0 centre (22, -25.3846) radius 0.8 projected
  circle A1 centre (4, -25.3846) radius 0.8 projected
  circle A2 centre (4, -4.6154) radius 0.8 projected
  circle A3 centre (22, -4.6154) radius 0.8 projected
  line L3 (22, -25.3846) -> (4, -4.6154)
  line L4 (4, -25.3846) -> (22, -4.6154)
  line L5 (17.5, -23.6538) -> (8.5, -23.6538)
  line L6 (5.5, -20.6538) -> (5.5, -9.3462)
  line L7 (8.5, -6.3462) -> (17.5, -6.3462)
  line L8 (20.5, -9.3462) -> (20.5, -20.6538)
  arc A4 (26, -3) -> (23, 0) centre (23, -3) ccw
  line L9 (0, 0) -> (26, 0) projected
  arc A5 (3, 0) -> (0, -3) centre (3, -3) ccw
  arc A6 (17.5, -23.6538) -> (20.5, -20.6538) centre (17.5, -20.6538) ccw
  arc A7 (5.5, -20.6538) -> (8.5, -23.6538) centre (8.5, -20.6538) ccw
  arc A8 (8.5, -6.3462) -> (5.5, -9.3462) centre (8.5, -9.3462) ccw
  arc A9 (20.5, -9.3462) -> (17.5, -6.3462) centre (17.5, -9.3462) ccw
  point P0 (0, -35)
  point P1 (20.5, -23.6538)
  point P2 (5.5, -6.3462)
  point P3 (5.5, -23.6538)
  dimension "d29" = 1.5
  dimension "d30" = 3
  dimension "d31" = 3
  dimension "d32" = 3
extrude "切り取り4" cut sketch "スケッチ6" against normal blind 1.5 contours L0 A4 L1 | L1 A5 L2 | A6 L5 A7 L4 L3 | L3 L4 A9 L8 A6 | L4 A7 L6 A8 L3 | L3 A8 L7 A9 L4
equation "\"d23\" = Thickness"
equation "\"d25\" = Thickness"
equation "\"d27\" = Thickness"
equation "\"d33\" = Thickness"
equation "\"d12\" = Thickness"
equation "\"d13\" = BendReliefWidth"
equation "\"d14\" = BendReliefDepth"
equation "\"d15\" = MinimumRemnant"
equation "\"d16\" = TransitionRadius"
equation "\"d19\" = BendRadius"
equation "\"d20\" = CornerReliefSize"
equation "\"d21\" = GapSize"
equation "\"d22\" = JacobiRadiusSize"
equation "\"BendRadius\" = Thickness"
equation "\"BendReliefWidth\" = Thickness"
equation "\"BendReliefDepth\" = 0.5 * Thickness"
equation "\"CornerReliefSize\" = 4 * Thickness"
equation "\"MinimumRemnant\" = 2 * Thickness"
equation "\"TransitionRadius\" = BendRadius"
equation "\"JacobiRadiusSize\" = BendRadius"
equation "\"GapSize\" = Thickness"
equation "\"Thickness\" = 1.5"
properties part number "toe_back" material "アルミニウム 6061"
